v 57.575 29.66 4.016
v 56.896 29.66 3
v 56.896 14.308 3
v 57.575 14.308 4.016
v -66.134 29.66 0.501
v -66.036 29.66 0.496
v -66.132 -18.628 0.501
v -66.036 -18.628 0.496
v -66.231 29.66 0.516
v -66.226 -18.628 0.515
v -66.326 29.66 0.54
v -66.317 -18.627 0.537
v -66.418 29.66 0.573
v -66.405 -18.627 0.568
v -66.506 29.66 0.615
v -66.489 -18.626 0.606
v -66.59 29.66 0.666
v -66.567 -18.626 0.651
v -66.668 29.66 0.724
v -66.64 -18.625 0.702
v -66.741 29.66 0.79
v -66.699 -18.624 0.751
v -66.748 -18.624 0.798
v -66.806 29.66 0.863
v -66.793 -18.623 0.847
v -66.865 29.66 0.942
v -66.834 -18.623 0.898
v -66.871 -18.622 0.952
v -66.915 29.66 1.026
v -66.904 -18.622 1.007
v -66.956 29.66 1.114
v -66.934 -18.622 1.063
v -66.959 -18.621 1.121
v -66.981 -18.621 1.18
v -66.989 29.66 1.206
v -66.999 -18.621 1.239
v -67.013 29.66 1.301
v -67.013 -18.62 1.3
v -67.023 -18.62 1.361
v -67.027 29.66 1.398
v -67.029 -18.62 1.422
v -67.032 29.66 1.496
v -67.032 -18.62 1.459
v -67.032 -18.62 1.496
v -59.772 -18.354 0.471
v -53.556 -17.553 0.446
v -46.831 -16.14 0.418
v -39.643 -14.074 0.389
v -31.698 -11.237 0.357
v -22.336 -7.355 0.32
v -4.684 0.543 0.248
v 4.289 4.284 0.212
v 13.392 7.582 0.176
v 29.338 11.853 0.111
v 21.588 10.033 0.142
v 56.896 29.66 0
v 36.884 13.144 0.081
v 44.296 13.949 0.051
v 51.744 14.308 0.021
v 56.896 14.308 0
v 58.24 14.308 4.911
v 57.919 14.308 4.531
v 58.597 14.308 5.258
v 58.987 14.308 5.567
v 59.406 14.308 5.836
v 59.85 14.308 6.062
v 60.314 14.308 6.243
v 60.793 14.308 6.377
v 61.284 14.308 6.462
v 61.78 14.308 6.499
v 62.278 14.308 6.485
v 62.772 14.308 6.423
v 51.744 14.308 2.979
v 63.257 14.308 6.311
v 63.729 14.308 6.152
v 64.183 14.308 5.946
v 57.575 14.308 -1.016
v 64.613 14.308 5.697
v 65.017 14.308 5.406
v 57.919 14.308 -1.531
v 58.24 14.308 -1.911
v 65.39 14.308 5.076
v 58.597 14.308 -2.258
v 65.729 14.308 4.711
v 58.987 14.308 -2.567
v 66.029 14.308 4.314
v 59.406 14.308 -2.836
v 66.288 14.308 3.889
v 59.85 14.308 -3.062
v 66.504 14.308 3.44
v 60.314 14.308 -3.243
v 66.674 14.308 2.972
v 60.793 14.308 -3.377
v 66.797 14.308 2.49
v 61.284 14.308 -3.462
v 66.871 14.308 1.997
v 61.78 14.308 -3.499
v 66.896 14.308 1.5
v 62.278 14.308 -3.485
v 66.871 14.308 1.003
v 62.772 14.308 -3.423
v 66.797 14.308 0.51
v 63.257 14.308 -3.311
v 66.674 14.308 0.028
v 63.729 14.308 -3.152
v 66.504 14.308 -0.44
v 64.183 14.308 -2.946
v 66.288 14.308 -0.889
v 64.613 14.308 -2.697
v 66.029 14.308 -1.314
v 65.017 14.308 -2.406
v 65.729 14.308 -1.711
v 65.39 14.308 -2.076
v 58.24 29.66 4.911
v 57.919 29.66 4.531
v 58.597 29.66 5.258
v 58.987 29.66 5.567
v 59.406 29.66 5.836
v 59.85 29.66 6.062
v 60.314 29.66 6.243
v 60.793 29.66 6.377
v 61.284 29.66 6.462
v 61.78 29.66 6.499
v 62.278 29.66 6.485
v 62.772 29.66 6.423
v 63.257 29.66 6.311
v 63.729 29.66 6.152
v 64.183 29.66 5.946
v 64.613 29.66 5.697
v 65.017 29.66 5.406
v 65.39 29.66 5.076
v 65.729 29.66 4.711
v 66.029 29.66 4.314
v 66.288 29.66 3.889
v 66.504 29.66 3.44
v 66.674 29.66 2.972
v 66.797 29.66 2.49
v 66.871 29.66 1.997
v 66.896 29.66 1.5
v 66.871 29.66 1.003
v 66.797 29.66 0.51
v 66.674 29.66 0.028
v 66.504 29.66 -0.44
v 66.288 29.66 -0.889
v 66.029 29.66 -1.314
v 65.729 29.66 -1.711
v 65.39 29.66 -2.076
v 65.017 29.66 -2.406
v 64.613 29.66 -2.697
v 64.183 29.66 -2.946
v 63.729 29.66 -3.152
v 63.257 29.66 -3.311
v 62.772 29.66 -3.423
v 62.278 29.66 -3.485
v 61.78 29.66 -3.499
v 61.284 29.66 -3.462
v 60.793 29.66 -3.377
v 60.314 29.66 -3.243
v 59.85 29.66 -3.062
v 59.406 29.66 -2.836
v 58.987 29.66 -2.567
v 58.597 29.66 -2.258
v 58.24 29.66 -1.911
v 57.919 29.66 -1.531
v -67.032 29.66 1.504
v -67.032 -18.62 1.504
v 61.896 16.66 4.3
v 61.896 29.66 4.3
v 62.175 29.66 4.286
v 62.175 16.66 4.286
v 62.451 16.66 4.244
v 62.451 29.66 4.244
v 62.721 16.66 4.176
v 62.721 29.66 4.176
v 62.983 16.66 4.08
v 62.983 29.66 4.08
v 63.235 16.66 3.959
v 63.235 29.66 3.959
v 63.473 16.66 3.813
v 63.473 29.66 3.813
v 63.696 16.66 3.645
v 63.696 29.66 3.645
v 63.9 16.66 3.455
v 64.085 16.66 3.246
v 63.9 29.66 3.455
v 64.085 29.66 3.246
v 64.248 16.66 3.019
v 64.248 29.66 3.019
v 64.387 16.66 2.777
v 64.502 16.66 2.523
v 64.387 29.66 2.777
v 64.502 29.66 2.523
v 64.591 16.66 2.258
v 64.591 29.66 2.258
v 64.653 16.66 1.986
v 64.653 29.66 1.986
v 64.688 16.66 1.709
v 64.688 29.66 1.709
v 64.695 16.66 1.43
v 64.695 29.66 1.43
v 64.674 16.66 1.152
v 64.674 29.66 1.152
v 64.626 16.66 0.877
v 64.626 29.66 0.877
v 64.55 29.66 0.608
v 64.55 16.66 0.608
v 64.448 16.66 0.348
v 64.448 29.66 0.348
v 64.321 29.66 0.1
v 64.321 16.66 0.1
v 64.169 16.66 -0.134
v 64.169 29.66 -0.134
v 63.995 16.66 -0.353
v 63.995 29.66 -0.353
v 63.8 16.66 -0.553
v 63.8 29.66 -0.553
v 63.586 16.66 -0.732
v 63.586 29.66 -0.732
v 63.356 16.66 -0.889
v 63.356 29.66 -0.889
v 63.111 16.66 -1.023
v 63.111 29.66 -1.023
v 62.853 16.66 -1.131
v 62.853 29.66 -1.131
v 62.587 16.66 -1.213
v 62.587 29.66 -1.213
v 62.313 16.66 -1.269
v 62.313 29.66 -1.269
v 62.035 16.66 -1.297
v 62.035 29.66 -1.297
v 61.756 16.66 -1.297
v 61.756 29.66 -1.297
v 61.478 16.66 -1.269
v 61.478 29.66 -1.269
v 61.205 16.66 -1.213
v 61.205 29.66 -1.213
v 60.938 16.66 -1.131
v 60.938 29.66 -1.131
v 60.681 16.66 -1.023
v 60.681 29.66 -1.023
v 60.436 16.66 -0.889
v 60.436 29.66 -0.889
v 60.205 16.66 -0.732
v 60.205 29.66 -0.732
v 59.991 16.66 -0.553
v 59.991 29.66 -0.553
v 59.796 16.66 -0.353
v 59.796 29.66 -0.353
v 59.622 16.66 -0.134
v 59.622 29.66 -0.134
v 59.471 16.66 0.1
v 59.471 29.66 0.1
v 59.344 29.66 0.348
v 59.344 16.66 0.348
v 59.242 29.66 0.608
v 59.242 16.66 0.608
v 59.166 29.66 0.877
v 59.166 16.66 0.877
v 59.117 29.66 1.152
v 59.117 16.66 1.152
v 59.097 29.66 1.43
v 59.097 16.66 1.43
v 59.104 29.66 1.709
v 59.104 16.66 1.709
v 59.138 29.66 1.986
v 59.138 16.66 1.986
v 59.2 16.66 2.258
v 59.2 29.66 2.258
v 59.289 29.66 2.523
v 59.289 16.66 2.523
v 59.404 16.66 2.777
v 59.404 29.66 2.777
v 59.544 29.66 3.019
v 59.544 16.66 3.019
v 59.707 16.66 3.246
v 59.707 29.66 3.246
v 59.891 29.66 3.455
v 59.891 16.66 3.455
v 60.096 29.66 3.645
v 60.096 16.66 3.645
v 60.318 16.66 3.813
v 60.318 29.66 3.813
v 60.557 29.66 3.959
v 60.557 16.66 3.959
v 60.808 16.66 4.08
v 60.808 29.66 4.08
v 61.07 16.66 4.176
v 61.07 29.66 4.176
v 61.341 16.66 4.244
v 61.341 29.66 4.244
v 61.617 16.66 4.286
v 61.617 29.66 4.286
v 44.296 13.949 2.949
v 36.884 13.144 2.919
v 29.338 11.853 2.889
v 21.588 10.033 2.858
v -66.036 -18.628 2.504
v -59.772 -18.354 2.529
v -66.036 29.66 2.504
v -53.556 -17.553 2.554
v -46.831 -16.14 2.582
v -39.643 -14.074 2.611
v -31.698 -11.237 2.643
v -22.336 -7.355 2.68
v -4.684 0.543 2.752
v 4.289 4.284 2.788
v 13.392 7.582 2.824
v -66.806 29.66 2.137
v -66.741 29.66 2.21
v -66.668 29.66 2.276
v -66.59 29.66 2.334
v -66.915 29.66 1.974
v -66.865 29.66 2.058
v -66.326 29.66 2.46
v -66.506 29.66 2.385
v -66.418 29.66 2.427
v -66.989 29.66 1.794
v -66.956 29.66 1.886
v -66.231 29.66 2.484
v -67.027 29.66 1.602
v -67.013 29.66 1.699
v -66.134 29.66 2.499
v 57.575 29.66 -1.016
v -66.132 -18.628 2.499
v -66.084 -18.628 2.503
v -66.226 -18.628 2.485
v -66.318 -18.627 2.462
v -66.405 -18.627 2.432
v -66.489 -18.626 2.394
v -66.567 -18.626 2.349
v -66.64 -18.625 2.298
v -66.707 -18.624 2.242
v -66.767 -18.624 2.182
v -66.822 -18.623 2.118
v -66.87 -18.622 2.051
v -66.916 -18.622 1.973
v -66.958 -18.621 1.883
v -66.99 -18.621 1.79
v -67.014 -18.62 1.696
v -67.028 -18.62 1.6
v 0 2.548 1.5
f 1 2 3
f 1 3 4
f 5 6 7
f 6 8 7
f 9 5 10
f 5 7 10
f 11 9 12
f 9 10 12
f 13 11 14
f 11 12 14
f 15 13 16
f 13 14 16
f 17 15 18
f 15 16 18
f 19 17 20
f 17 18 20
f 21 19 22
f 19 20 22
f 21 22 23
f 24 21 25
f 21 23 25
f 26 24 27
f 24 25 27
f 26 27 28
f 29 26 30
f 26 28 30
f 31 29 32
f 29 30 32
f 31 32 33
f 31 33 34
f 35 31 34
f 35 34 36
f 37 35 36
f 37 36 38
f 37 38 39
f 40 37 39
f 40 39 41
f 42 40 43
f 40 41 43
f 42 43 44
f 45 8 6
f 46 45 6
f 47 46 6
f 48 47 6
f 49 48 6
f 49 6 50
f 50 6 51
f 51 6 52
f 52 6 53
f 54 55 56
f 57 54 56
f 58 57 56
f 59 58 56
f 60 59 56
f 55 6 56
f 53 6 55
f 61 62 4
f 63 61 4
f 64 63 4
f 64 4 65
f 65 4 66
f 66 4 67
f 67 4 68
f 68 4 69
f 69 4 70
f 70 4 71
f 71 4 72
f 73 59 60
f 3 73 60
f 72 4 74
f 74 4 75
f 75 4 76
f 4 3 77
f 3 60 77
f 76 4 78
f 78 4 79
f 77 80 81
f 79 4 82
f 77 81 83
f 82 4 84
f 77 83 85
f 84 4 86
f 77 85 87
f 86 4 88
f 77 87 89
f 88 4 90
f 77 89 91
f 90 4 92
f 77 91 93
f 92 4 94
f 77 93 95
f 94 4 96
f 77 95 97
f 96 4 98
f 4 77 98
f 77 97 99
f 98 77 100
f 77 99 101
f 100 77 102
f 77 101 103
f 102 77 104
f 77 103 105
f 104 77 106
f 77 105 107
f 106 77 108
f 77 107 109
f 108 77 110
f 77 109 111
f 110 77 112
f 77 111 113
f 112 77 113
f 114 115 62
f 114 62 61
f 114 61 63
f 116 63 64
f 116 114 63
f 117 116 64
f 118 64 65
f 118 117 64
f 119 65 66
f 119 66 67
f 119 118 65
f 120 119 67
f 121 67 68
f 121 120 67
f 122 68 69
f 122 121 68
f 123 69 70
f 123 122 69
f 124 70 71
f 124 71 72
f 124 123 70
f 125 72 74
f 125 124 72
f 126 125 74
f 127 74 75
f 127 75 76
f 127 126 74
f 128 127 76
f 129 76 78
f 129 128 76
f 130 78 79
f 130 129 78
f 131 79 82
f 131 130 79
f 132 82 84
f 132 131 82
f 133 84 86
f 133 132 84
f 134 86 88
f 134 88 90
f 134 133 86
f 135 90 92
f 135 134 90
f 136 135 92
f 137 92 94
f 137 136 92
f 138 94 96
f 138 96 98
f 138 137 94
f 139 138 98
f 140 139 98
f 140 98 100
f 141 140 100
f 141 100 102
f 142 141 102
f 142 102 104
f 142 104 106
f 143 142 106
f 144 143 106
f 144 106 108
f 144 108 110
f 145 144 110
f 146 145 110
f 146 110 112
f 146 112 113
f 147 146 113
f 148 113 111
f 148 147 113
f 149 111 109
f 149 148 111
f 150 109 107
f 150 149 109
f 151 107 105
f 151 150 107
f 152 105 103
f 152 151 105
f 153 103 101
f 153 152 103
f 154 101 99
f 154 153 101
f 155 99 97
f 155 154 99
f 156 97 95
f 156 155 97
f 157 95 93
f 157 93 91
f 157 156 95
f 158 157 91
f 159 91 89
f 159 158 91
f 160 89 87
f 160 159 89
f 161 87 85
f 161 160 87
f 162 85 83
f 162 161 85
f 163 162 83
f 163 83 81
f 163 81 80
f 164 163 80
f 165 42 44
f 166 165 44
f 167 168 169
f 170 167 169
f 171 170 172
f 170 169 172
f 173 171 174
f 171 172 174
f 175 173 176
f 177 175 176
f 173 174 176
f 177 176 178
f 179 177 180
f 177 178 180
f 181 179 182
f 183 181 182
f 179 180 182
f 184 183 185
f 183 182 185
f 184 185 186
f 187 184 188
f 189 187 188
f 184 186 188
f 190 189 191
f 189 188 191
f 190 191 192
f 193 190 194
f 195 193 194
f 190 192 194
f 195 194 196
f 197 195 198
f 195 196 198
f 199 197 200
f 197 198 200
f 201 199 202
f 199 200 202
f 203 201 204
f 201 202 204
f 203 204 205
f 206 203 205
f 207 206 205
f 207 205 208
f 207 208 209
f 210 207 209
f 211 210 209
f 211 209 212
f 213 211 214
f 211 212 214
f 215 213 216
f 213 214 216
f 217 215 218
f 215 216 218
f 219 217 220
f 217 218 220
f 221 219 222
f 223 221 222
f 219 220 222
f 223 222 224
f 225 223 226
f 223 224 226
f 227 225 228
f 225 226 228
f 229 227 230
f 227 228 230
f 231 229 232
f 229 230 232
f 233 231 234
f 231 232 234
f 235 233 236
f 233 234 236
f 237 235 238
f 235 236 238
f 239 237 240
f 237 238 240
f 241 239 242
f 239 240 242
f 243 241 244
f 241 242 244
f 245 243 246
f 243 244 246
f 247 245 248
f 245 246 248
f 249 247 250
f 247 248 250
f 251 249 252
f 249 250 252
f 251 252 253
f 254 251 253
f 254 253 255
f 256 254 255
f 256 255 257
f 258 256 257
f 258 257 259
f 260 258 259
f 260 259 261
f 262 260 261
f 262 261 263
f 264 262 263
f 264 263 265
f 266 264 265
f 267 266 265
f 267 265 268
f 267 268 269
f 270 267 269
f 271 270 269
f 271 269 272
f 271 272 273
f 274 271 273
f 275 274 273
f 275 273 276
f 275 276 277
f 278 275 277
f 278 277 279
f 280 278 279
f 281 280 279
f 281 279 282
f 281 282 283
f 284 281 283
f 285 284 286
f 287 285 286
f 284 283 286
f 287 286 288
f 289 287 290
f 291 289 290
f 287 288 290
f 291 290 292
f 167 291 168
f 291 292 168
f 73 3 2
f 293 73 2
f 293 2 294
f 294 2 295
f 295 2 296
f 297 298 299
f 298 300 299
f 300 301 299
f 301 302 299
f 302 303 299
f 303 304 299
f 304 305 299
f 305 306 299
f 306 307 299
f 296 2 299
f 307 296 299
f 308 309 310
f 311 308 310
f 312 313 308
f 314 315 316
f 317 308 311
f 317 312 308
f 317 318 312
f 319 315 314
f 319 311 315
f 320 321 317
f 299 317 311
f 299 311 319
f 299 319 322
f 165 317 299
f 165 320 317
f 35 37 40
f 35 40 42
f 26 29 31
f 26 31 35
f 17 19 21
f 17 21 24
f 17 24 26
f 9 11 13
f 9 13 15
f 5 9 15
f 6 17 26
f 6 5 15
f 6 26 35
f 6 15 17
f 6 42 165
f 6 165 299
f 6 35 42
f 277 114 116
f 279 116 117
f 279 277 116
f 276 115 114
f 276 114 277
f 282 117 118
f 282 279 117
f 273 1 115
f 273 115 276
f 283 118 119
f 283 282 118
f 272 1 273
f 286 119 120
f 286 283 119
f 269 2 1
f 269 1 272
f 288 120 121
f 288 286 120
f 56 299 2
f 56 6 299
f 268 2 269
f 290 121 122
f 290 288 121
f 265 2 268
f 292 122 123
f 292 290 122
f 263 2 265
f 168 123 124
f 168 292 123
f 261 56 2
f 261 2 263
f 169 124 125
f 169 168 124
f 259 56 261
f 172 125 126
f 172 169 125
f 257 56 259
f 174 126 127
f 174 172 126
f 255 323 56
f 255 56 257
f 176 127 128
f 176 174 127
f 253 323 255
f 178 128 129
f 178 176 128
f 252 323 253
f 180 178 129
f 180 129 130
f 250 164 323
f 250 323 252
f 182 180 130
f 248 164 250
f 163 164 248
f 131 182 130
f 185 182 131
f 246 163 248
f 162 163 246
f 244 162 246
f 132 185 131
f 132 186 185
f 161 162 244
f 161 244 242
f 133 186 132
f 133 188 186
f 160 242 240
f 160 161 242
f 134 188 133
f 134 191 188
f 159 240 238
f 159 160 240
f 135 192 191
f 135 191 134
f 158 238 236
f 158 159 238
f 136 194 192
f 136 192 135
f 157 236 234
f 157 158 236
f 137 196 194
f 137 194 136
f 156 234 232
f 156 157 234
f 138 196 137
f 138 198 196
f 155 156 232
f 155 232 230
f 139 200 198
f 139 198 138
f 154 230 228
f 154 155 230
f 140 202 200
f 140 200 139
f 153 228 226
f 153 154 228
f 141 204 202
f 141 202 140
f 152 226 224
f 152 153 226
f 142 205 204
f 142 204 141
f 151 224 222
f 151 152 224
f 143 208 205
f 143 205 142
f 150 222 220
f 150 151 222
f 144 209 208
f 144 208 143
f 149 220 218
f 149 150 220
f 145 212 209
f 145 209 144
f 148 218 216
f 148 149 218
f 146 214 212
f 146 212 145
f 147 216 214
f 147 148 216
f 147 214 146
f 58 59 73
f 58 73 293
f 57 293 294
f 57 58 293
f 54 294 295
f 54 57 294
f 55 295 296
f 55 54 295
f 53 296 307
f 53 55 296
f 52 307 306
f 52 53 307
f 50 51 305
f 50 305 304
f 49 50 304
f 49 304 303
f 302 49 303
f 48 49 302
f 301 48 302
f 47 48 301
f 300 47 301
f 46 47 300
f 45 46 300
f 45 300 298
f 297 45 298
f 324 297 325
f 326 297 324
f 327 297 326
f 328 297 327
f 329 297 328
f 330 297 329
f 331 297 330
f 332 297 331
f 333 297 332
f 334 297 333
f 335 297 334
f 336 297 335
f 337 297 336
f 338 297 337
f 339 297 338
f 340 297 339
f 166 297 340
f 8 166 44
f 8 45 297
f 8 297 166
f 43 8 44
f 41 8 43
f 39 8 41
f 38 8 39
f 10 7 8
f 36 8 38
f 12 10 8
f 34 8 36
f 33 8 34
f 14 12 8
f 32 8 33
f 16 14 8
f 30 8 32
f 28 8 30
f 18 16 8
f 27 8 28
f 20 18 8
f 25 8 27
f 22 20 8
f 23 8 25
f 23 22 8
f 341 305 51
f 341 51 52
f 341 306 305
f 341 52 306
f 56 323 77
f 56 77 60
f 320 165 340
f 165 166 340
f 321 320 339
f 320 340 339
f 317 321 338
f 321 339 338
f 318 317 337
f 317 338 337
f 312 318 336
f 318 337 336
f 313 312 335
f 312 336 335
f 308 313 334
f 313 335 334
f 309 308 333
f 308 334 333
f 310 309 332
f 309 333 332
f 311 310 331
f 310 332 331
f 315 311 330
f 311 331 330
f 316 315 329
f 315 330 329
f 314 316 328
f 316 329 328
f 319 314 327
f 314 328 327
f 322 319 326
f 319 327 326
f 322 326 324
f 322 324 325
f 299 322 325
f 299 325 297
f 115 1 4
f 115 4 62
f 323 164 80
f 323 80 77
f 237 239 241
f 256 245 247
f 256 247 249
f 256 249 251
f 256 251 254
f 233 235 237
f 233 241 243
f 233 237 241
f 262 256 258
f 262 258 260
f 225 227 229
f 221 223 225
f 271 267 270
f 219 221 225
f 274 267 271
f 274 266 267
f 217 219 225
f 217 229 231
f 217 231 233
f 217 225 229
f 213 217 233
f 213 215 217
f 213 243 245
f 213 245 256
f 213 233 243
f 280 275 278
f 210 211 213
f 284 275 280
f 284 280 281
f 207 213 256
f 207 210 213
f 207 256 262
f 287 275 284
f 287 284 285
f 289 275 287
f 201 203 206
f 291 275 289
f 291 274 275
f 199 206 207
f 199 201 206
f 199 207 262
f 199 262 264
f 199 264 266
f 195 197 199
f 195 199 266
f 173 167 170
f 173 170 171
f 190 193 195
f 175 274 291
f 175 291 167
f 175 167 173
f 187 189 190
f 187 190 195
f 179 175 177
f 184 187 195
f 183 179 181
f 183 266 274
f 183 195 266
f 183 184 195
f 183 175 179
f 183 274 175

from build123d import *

# Parameters (mm, degrees)
Y_KSEKLIK_EKSTR_ZYON1_DEPTH = 3
Y_KSEKLIK_EKSTR_ZYON3_DEPTH = 15.352247347
KES_EKSTR_ZYON6_DEPTH       = 83.869457244
RADYUS1_R                   = 1
IZIM9_R                     = 2.8
KES_EKSTR_ZYON7_DEPTH       = 13


with BuildPart() as part:
    # Çizim1 → Yükseklik-Ekstrüzyon1 (new body)
    with BuildSketch(Plane.XY):
        with BuildLine():
            Line((51.744165627, 14.308045798), (56.895737739, 14.308045798))
            Line((56.895737739, 14.308045798), (56.895737739, 29.660293145))
            Line((56.895737739, 29.660293145), (-67.032214562, 29.660293145))
            Line((-67.032214562, 29.660293145), (-67.032214562, -18.6200596))
            add(Edge.make_bspline(
                [(51.744165627, 14.308045798), (32.353014477, 13.942055171), (-5.53549701, 3.029288221), (-42.761336594, -18.994069798), (-67.032214562, -18.6200596)],
                knots=[0, 0, 0, 0, 0.428556307, 1, 1, 1, 1], degree=3))
        make_face()
    extrude(amount=Y_KSEKLIK_EKSTR_ZYON1_DEPTH)

    # Çizim5 → Yükseklik-Ekstrüzyon3 (add)
    with BuildSketch(Plane(origin=(0, 29.660293145, 0), x_dir=(1, 0, 0), z_dir=(0, 1, 0))):
        with BuildLine():
            Line((57.574880058, 1.015986664), (56.895737739, 0))
            Line((56.895737739, 0), (56.895737739, -3))
            Line((56.895737739, -3), (57.574880058, -4.015986664))
            Line((57.574880058, -4.015986664), (57.918910072, -4.530650376))
            ThreePointArc((57.918910072, -4.530650376), (66.895737739, -1.5), (57.918910072, 1.530650376))
            Line((57.918910072, 1.530650376), (57.574880058, 1.015986664))
        make_face()
    extrude(amount=-Y_KSEKLIK_EKSTR_ZYON3_DEPTH)

    # Çizim7 → Kes-Ekstrüzyon6 (cut, through all)
    with BuildSketch(Plane(origin=(0, 29.660293145, 0), x_dir=(1, 0, 0), z_dir=(0, 1, 0))):
        Polygon((-67.032214562, -0.5), (56.895737739, 0), (-67.032214562, 0), align=None)
        Polygon((-67.032214562, -3), (56.895737739, -3), (-67.032214562, -2.5), align=None)
    extrude(amount=-KES_EKSTR_ZYON6_DEPTH, mode=Mode.SUBTRACT)

    # Radyus1
    radyus1_edges = [part.edges().sort_by_distance(p)[0] for p in [
        (-67.032214562, 5.520116772, 2.5),
        (-67.032214562, 5.520116772, 0.5),
    ]]
    fillet(radyus1_edges, radius=RADYUS1_R)

    # Çizim9 → Kes-Ekstrüzyon7 (cut)
    with BuildSketch(Plane(origin=(0, 29.660293145, 0), x_dir=(-1, 0, 0), z_dir=(0, 1, 0))):
        with Locations(Location((-61.895737739, 1.5, 0), (0, 0, 90))):
            Circle(IZIM9_R)
    extrude(amount=-KES_EKSTR_ZYON7_DEPTH, mode=Mode.SUBTRACT)


solid = part.part
